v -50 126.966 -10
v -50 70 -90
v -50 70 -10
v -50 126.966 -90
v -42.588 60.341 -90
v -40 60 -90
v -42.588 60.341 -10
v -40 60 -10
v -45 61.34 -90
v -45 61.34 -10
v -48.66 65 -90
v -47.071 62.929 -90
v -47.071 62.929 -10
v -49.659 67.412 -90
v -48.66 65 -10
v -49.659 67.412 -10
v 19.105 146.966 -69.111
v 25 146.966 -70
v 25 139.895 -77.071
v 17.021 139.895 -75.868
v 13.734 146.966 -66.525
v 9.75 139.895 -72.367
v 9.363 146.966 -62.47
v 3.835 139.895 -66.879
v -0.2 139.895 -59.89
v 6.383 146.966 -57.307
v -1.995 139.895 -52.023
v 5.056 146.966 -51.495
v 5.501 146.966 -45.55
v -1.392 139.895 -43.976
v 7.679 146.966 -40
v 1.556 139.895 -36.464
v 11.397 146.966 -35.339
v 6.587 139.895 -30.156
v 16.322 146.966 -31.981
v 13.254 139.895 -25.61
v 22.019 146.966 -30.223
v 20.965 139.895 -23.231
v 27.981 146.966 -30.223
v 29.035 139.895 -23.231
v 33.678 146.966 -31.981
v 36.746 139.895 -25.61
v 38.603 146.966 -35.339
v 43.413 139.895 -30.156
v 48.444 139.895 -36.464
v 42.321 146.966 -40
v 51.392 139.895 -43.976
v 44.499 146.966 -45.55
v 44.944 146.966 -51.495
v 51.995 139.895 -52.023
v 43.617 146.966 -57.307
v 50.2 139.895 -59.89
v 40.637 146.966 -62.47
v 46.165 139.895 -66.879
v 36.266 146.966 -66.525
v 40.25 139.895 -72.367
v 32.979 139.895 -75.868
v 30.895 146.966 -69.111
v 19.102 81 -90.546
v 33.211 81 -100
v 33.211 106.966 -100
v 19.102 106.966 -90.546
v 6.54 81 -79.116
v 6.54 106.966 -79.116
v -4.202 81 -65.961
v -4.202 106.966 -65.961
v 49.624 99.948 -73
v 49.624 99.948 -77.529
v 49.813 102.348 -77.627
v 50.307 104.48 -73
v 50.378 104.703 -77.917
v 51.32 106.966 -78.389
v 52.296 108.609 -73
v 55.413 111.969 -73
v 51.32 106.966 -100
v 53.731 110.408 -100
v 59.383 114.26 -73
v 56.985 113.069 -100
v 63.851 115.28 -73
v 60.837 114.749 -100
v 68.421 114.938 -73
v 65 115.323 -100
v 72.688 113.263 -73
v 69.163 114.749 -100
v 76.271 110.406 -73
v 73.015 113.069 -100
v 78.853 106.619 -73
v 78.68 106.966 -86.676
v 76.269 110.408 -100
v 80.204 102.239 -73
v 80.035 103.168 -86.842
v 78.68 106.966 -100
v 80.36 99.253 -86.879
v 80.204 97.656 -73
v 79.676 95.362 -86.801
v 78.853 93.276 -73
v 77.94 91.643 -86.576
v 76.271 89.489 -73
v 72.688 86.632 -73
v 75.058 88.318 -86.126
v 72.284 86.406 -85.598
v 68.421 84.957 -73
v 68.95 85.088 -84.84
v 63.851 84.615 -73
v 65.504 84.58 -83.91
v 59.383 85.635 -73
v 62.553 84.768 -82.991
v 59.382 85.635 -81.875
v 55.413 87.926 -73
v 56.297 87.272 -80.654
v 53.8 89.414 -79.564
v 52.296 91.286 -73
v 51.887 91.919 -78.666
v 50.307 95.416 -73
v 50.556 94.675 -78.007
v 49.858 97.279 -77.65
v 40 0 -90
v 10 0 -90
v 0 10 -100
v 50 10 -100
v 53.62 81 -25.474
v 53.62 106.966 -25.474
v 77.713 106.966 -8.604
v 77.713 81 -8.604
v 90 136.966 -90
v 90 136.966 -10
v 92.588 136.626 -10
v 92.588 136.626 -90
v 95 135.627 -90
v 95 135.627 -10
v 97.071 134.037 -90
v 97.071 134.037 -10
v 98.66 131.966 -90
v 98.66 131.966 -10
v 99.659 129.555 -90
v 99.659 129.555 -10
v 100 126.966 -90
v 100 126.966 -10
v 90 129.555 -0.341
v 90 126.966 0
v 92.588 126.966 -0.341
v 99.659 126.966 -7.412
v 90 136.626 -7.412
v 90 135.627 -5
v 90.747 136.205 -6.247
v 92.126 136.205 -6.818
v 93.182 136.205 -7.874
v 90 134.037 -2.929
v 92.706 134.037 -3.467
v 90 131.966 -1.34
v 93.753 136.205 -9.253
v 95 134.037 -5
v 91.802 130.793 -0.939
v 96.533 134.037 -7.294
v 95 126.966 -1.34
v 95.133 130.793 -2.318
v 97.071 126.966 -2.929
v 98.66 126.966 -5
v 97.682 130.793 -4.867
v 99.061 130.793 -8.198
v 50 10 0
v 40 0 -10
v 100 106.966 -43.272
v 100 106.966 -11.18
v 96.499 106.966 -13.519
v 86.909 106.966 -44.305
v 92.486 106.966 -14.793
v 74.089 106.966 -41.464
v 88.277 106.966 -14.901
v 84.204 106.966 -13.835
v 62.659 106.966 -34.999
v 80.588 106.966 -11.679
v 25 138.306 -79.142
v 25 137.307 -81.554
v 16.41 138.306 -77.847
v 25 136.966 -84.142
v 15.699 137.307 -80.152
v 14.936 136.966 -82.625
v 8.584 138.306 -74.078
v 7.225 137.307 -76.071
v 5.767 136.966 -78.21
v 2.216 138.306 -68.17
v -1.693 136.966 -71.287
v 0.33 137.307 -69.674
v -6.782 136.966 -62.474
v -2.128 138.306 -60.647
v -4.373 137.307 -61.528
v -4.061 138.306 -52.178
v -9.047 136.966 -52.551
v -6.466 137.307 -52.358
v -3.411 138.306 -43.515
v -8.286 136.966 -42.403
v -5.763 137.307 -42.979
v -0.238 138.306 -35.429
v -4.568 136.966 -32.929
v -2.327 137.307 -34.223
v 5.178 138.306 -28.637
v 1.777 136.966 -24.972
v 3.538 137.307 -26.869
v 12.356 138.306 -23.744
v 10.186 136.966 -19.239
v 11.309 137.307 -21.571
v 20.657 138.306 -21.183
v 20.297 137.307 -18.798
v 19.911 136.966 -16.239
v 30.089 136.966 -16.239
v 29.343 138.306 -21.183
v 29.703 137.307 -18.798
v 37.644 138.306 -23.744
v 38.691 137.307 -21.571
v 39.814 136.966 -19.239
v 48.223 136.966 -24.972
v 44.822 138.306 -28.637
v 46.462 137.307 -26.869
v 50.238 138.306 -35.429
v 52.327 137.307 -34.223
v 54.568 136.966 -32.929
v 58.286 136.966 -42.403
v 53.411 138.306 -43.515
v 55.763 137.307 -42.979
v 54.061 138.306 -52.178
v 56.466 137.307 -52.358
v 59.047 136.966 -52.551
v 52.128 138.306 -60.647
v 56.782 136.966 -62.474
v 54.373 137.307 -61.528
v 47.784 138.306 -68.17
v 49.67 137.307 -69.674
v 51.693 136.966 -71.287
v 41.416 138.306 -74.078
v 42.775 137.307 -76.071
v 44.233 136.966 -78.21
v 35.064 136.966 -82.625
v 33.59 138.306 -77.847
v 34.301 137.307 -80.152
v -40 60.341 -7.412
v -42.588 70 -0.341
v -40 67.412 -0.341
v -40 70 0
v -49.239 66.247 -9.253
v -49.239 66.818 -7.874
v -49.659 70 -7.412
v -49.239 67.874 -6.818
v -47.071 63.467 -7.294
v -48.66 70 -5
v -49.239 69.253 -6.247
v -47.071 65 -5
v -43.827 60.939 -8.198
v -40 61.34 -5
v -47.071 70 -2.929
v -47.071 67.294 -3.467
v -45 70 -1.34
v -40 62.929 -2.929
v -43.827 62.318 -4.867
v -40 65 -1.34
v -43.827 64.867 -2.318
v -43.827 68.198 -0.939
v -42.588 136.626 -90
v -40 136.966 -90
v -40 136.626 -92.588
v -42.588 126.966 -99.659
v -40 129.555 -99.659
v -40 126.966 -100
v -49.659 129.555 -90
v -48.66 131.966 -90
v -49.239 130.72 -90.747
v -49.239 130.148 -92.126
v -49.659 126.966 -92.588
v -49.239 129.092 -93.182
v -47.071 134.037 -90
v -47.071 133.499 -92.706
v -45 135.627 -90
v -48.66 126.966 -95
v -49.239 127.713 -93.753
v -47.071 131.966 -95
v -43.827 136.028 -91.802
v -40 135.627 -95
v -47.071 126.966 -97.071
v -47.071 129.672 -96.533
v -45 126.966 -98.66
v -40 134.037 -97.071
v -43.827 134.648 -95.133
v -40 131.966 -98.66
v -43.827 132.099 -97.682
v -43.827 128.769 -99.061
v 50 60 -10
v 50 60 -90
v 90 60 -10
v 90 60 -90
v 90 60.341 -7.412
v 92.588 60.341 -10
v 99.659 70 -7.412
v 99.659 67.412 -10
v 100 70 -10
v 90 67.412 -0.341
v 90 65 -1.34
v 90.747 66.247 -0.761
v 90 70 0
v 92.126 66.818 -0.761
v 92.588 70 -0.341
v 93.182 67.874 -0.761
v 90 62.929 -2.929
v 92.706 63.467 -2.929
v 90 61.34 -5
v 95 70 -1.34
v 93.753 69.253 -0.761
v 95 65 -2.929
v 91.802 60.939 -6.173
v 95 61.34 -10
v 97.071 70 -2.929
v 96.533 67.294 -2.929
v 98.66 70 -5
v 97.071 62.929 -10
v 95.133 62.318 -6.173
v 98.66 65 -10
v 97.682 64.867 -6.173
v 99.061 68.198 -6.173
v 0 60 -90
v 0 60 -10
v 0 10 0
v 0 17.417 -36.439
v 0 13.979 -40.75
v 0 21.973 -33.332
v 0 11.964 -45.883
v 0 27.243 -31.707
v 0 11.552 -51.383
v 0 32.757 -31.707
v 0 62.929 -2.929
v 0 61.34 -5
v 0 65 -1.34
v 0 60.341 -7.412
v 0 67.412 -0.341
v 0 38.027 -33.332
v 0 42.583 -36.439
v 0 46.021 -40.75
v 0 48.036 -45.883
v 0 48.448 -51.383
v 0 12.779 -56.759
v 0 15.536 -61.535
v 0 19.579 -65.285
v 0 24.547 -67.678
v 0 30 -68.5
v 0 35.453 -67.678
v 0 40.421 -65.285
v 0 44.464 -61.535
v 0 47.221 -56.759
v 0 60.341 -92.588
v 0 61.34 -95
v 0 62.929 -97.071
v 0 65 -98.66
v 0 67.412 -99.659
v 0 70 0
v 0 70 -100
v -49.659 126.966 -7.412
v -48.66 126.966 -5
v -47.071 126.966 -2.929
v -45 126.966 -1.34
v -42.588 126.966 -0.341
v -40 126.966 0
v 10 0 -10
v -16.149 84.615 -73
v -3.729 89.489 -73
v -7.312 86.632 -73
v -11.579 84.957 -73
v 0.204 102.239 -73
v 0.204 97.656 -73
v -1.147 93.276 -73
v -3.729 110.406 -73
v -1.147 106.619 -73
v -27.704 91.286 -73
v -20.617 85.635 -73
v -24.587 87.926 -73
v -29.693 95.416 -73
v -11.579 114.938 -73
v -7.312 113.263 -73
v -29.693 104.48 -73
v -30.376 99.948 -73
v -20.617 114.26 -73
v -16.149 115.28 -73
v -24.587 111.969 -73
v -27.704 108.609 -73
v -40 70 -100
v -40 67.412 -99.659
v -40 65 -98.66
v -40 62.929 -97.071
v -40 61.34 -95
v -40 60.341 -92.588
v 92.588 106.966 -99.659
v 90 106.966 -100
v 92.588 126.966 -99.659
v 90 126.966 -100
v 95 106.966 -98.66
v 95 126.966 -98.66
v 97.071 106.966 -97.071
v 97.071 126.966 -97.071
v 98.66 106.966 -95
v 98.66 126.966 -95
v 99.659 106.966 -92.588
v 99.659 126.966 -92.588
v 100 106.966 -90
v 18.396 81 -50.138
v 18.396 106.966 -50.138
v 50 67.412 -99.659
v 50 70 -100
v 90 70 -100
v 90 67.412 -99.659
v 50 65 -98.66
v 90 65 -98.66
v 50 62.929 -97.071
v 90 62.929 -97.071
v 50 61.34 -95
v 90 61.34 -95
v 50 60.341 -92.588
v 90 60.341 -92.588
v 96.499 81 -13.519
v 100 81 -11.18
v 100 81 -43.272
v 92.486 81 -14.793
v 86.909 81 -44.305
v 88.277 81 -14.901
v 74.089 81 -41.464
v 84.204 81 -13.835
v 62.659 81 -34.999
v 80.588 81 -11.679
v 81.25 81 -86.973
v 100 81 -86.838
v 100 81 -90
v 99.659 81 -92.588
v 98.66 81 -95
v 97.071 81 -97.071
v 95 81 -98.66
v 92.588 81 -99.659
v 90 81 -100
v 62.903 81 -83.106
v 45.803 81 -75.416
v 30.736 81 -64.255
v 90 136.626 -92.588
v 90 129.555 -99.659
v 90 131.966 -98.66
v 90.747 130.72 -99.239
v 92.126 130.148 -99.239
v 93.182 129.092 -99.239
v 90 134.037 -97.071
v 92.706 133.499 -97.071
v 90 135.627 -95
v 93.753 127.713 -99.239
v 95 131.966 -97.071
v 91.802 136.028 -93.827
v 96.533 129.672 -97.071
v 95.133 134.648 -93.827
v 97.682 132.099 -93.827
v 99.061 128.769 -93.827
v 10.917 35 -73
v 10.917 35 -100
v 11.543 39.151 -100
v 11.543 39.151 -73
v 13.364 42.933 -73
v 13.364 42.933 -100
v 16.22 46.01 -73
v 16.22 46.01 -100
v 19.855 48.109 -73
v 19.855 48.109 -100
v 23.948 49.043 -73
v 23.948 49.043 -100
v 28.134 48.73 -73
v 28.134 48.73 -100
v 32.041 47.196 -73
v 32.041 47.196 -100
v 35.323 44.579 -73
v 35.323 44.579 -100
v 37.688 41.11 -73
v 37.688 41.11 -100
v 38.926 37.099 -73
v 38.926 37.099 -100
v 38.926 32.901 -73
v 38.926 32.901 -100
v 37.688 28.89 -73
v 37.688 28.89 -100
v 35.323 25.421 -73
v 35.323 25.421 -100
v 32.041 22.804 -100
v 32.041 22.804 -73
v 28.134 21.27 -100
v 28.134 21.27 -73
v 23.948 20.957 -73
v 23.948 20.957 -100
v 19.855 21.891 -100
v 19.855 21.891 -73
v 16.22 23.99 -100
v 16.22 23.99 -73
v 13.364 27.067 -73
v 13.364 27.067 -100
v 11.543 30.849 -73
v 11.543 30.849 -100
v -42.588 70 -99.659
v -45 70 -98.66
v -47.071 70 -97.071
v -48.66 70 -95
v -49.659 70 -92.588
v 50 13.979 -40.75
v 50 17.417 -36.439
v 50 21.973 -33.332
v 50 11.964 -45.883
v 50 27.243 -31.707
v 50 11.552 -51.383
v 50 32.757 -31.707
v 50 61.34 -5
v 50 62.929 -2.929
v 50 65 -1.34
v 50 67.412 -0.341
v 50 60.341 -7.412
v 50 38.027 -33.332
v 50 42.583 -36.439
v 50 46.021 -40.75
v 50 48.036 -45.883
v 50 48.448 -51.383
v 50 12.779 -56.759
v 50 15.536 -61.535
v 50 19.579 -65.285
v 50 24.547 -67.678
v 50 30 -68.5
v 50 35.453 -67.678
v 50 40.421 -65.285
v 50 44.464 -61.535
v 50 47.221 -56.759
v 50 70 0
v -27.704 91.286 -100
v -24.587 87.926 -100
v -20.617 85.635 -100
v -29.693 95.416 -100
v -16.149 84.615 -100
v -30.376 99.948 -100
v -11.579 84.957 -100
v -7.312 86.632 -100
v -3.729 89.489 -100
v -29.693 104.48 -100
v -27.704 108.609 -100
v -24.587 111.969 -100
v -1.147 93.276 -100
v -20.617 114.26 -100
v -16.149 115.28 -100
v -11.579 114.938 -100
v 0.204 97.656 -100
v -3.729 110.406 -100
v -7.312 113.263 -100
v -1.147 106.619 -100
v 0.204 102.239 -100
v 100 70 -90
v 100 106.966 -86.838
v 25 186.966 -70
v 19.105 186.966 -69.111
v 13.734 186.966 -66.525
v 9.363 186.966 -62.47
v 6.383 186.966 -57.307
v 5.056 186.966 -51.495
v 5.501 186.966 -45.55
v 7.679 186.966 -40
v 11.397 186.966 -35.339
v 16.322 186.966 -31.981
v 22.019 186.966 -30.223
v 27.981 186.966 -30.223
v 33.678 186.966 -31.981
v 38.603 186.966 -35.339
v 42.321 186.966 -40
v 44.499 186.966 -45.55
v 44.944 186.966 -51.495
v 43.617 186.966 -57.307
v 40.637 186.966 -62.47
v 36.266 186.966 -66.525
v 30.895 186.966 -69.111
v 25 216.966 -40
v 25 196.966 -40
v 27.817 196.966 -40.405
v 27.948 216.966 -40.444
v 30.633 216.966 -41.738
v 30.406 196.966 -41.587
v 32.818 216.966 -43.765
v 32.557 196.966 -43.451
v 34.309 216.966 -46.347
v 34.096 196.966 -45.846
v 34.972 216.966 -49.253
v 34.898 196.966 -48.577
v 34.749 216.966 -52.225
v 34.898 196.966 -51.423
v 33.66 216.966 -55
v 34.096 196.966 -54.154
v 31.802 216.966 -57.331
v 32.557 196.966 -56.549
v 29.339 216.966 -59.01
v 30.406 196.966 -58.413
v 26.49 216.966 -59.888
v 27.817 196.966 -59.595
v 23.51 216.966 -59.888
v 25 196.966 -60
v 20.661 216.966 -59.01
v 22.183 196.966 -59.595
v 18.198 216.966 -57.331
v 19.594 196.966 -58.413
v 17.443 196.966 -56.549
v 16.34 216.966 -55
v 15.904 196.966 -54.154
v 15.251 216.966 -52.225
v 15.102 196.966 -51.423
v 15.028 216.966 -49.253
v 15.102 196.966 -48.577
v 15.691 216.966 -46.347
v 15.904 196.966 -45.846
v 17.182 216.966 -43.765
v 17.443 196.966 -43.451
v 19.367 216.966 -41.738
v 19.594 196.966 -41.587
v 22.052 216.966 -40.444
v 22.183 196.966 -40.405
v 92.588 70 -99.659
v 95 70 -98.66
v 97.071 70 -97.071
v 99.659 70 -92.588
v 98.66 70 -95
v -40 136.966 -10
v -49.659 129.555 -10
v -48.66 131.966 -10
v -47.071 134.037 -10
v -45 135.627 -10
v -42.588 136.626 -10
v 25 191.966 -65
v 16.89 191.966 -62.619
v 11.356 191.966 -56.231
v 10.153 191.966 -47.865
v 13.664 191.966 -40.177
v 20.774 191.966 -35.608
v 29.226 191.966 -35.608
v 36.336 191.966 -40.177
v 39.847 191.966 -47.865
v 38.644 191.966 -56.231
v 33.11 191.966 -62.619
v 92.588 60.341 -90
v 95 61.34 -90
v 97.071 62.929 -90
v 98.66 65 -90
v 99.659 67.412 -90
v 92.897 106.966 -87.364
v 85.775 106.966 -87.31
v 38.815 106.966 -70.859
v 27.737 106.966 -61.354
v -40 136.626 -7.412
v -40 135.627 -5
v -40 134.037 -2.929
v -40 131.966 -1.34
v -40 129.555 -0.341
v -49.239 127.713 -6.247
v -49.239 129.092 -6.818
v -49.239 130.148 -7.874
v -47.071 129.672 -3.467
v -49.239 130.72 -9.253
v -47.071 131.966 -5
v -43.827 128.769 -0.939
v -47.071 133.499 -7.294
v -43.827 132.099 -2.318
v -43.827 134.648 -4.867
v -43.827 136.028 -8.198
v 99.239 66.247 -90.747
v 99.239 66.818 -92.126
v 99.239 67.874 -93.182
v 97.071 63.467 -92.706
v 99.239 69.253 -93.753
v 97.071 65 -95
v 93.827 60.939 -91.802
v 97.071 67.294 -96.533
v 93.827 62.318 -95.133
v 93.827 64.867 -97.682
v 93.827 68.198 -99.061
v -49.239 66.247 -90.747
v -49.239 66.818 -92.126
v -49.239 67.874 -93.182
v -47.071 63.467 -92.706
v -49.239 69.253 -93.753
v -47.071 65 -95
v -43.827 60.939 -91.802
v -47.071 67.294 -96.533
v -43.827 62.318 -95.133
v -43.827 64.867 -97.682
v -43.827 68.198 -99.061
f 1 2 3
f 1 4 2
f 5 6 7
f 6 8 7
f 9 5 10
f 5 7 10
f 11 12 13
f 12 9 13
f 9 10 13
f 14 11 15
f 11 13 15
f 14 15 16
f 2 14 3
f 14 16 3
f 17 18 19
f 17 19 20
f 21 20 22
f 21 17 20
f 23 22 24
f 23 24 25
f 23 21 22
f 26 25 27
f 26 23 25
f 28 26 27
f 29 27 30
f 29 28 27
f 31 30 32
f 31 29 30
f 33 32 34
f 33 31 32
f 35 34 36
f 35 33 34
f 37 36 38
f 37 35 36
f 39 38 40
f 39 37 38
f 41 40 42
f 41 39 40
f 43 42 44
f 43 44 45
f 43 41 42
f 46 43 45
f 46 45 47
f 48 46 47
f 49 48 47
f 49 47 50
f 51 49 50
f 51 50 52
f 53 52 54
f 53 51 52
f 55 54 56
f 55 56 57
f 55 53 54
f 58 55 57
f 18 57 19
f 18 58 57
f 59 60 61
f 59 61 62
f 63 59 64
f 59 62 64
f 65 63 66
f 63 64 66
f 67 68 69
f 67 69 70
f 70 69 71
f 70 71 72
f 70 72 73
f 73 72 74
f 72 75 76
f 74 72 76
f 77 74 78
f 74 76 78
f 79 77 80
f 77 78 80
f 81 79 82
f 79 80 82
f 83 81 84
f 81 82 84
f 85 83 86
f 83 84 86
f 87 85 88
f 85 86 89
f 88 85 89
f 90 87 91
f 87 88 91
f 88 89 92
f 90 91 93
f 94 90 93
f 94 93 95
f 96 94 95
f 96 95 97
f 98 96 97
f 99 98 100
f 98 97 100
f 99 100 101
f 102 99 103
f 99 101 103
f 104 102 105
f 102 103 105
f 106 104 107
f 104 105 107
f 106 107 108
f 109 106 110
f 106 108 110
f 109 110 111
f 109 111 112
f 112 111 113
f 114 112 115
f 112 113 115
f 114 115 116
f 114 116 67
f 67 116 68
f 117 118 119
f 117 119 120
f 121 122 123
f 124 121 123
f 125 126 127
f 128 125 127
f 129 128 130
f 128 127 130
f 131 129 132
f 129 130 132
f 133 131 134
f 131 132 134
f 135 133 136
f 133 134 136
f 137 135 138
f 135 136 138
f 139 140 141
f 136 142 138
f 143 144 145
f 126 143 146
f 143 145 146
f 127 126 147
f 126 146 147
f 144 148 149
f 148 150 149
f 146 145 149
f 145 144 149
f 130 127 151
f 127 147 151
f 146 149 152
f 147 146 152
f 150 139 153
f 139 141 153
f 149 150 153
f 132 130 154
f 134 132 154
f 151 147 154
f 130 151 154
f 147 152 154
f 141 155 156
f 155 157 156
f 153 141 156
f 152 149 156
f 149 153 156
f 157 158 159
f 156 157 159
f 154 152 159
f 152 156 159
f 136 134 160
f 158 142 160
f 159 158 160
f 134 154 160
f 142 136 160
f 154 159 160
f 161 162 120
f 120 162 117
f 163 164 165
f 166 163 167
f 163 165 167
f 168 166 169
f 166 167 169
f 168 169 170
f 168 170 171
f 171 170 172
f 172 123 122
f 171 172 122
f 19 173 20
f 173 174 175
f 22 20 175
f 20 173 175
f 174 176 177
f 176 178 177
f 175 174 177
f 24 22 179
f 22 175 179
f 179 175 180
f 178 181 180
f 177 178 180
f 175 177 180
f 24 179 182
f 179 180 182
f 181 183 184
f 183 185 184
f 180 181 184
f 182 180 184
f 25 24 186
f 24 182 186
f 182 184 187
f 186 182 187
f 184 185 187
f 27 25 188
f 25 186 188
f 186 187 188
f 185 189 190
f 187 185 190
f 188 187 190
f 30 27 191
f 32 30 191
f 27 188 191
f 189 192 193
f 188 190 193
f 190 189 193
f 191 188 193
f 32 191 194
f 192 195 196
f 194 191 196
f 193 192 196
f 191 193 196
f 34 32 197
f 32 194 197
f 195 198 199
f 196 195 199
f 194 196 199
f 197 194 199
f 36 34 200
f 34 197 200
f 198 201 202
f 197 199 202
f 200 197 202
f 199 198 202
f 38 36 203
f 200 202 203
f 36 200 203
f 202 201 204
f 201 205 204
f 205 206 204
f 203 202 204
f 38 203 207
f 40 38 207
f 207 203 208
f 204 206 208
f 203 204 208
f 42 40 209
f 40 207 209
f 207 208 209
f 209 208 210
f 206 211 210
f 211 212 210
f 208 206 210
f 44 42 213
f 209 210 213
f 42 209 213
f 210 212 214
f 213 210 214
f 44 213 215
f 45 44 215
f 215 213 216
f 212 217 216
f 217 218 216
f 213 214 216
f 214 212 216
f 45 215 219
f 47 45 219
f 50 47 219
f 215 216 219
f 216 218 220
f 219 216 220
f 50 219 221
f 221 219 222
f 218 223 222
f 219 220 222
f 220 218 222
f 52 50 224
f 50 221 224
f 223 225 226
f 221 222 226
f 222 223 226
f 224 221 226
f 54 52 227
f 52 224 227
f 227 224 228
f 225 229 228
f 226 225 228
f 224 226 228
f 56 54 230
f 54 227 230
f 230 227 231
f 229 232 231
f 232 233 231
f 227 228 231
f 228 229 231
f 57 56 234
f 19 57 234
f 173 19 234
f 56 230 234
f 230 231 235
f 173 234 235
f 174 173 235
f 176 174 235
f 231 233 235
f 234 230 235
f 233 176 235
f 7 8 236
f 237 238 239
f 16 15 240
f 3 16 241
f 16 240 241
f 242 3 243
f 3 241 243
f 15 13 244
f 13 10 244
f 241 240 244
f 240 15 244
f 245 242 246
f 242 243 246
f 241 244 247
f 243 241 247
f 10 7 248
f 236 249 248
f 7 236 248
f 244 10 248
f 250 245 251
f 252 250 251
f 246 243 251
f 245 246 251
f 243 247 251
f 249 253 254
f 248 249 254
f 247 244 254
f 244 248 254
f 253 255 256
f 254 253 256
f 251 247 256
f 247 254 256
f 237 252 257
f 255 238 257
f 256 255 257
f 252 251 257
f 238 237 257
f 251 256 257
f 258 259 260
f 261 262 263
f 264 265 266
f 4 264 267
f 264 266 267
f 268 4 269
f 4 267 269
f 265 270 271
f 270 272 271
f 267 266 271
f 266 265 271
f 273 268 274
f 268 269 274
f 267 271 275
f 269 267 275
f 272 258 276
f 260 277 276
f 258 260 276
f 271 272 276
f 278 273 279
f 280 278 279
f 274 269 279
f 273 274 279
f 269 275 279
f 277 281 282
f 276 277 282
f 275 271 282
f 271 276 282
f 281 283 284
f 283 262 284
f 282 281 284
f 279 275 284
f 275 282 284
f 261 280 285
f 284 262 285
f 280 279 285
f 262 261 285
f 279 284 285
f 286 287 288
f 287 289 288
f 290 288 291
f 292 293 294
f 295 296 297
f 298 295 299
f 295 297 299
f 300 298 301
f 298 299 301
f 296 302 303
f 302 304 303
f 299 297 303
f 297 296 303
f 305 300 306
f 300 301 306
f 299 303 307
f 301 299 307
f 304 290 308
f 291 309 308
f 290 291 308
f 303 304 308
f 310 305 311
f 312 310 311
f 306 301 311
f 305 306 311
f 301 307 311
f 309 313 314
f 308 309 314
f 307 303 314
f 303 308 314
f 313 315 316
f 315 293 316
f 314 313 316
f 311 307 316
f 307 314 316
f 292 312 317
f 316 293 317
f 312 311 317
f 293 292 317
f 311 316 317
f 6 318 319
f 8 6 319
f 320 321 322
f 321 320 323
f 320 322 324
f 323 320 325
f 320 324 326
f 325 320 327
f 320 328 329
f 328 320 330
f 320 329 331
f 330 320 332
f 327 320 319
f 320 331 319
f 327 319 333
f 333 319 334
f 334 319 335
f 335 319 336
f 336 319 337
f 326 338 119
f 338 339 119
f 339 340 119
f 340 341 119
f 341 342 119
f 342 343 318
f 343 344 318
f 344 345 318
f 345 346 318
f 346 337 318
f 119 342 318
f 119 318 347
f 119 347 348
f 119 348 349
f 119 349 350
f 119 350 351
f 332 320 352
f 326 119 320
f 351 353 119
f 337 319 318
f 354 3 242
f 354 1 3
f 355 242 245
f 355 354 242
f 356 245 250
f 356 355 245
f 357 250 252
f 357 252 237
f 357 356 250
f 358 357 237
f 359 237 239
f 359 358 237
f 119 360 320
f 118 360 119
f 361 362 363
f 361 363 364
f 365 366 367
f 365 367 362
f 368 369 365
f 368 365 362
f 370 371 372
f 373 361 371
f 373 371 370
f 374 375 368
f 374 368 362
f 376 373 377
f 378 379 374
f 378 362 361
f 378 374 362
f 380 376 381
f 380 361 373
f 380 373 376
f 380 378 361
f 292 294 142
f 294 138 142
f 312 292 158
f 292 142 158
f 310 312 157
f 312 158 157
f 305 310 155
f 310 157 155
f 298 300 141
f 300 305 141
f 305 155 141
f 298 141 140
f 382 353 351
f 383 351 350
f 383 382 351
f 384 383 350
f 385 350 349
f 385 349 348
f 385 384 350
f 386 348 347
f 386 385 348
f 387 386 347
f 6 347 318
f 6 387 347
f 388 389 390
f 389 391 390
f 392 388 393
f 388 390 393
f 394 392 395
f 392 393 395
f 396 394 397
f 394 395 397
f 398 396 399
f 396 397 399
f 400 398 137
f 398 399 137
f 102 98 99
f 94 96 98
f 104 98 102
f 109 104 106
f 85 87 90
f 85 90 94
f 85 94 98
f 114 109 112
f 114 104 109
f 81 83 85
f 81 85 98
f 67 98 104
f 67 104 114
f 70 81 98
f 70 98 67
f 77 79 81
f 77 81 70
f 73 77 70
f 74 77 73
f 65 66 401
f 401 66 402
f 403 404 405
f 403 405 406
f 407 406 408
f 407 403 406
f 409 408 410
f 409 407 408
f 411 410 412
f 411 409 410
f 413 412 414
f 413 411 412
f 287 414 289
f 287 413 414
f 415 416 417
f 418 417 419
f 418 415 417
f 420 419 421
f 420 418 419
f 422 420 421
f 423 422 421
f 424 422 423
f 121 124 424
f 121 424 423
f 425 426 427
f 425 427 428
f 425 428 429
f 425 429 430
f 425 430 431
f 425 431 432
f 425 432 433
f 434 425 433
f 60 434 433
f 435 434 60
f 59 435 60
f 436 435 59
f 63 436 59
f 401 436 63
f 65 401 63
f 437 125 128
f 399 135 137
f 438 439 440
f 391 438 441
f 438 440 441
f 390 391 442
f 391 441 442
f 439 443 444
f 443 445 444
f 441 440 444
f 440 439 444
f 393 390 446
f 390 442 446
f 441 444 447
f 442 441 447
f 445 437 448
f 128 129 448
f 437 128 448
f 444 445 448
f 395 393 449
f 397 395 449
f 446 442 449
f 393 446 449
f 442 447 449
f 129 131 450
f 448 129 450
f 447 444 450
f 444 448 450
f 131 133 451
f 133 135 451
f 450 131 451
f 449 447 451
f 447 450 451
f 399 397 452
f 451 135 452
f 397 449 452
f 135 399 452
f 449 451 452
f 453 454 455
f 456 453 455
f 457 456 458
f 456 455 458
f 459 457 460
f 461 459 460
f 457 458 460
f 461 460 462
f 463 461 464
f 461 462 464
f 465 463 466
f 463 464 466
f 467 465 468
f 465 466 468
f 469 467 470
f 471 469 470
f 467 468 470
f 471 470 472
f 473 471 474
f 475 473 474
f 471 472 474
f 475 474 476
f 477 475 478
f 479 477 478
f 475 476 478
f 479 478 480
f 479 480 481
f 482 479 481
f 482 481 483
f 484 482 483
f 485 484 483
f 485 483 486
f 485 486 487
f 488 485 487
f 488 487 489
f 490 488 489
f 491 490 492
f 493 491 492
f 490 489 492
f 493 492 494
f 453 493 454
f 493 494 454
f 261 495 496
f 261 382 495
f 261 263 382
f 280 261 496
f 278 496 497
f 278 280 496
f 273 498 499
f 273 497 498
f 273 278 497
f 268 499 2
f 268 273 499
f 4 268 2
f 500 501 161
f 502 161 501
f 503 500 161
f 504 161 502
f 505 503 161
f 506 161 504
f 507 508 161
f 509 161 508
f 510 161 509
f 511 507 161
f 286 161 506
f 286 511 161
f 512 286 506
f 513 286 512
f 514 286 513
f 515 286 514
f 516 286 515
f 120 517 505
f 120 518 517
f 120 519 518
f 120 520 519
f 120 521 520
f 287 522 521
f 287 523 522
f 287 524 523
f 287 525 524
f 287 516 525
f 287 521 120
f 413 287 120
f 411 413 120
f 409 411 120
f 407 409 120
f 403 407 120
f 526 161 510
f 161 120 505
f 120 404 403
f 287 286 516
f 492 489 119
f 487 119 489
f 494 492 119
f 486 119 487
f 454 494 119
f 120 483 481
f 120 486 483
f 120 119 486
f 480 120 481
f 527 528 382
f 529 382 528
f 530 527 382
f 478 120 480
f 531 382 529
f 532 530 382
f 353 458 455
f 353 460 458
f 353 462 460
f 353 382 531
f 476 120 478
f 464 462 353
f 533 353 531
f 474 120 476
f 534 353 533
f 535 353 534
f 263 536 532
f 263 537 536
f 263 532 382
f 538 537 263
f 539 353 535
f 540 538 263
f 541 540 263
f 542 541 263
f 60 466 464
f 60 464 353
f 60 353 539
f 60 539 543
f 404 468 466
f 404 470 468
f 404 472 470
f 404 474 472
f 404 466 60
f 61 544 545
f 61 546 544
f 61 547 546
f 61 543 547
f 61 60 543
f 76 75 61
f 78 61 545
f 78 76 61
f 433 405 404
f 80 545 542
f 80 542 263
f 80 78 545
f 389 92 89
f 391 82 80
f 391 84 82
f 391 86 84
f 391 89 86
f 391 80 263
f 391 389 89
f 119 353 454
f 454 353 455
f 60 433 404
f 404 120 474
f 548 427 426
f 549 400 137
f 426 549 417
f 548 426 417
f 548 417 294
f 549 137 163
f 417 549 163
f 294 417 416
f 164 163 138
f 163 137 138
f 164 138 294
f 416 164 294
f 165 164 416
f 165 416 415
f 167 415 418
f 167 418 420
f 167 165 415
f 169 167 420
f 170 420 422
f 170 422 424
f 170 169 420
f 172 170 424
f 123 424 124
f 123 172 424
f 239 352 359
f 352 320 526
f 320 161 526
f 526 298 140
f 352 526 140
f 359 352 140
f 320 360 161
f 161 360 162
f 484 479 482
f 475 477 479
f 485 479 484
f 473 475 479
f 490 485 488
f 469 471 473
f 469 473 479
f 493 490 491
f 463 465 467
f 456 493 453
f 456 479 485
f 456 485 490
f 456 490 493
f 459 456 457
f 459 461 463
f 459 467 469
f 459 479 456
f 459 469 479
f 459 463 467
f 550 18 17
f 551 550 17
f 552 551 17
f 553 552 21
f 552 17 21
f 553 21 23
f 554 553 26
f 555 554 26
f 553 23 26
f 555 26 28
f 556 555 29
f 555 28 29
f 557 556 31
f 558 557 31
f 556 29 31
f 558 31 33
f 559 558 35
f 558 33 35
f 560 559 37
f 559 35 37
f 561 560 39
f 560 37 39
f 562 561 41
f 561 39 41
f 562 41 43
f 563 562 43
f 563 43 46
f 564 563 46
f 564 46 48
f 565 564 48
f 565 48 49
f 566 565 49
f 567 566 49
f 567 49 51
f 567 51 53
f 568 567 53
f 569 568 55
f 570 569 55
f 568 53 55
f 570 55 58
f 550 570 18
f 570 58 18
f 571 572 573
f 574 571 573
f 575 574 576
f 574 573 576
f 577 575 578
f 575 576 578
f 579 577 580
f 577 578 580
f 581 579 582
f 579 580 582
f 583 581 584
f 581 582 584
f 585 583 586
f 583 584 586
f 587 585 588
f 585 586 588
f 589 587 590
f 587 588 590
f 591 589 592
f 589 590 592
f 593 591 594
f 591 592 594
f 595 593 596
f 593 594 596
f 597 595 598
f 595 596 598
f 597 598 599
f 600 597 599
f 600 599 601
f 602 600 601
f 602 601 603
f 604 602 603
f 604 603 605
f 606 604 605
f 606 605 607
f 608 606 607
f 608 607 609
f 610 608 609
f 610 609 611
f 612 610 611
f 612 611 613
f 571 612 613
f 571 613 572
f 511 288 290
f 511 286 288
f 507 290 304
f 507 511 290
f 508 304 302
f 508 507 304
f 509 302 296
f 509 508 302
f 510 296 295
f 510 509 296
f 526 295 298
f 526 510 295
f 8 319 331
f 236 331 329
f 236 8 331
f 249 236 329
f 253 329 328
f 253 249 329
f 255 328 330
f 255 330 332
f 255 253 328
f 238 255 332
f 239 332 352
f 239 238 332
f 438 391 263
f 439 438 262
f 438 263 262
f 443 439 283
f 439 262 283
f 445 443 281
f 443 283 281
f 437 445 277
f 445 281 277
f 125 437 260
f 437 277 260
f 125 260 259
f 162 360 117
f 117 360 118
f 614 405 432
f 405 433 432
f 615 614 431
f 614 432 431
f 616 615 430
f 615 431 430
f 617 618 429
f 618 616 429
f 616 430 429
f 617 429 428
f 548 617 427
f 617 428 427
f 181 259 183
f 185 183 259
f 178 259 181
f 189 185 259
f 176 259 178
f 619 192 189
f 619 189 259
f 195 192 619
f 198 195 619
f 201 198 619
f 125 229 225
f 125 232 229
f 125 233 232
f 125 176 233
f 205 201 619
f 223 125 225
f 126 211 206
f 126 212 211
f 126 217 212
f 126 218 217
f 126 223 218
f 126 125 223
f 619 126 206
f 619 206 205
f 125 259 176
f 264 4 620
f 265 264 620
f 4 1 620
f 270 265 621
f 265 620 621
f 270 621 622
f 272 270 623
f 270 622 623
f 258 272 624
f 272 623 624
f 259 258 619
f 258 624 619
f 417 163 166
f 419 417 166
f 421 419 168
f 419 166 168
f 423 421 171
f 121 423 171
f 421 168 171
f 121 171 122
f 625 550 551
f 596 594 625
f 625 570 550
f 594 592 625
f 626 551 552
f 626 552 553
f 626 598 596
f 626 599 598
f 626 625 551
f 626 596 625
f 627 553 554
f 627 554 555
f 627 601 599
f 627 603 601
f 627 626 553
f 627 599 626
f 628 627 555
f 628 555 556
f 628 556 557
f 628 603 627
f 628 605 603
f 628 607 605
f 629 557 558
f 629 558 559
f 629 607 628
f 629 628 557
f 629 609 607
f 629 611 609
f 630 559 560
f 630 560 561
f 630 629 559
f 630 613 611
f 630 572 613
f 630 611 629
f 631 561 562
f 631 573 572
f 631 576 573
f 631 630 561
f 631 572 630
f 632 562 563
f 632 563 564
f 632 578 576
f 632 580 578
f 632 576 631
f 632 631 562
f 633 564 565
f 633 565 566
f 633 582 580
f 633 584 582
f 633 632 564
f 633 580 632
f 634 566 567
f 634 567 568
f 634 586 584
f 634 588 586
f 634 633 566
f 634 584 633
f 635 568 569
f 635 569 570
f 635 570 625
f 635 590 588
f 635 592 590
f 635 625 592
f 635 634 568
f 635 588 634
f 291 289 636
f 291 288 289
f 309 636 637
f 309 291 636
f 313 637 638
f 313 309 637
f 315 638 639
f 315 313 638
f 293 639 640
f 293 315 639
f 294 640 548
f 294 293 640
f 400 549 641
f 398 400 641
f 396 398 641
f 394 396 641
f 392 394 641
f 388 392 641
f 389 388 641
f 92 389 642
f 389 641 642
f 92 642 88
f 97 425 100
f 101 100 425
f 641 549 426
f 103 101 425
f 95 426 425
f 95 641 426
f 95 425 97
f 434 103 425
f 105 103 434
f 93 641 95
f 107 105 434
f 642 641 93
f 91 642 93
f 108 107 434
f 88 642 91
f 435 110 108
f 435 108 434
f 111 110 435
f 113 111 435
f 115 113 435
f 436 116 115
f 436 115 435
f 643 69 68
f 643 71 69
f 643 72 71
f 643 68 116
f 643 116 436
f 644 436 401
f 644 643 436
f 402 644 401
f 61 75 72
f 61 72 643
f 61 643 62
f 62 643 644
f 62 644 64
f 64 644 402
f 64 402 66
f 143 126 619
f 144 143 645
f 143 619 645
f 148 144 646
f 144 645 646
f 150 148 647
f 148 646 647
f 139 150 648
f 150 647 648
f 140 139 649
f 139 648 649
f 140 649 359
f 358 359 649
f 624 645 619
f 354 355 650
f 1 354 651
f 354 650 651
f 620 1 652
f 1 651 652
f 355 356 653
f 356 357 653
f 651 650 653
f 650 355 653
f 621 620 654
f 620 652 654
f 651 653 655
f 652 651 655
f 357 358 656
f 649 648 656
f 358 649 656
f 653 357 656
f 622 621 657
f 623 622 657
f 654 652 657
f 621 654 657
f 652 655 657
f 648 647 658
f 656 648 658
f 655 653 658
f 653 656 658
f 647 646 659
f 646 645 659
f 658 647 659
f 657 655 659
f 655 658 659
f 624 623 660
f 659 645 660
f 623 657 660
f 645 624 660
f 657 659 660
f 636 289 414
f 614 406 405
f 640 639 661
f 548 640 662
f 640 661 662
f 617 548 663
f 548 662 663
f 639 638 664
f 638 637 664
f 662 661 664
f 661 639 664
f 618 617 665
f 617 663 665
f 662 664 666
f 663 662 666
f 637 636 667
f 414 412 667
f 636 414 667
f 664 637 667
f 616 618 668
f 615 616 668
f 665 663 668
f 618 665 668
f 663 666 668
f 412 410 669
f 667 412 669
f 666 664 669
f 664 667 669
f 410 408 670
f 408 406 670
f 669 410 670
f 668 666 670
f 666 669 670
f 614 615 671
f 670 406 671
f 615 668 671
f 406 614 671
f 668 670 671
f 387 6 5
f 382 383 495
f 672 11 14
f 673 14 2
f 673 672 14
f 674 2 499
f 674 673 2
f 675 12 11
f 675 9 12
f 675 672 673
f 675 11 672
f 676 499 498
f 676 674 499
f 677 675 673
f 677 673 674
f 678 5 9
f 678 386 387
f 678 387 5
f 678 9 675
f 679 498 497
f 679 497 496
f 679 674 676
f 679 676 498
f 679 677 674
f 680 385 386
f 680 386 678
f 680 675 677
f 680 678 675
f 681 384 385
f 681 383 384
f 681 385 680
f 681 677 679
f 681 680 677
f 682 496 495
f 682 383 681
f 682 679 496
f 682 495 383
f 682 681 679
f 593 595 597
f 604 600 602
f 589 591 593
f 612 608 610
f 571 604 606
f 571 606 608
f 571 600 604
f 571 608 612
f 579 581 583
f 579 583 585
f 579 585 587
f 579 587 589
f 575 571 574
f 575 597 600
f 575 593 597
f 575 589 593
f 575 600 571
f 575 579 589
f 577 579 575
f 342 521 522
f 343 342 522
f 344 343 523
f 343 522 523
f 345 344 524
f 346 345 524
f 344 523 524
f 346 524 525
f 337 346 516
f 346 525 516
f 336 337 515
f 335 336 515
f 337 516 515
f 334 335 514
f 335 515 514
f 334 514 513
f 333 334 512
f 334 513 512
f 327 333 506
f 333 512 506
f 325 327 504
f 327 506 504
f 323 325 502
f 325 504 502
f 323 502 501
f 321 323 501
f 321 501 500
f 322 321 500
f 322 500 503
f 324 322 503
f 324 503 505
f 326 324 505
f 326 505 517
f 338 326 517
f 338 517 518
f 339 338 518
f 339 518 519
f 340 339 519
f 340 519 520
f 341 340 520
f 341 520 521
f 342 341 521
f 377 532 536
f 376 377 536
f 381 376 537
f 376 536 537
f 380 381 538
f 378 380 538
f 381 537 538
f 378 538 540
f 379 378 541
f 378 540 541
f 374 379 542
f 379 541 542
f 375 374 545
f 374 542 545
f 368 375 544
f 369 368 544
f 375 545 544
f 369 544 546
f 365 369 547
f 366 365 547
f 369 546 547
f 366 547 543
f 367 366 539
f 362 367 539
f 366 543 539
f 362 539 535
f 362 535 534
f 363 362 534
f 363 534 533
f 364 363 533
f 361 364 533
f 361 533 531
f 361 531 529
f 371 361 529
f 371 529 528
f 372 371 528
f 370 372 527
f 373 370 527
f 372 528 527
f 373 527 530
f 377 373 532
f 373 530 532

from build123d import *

# Parameters (mm, degrees)
ESBO_O2_W                     = 100
ESBO_O2_H                     = 60
RESSALTO_EXTRUS_O1_DEPTH      = 50
RESSALTO_EXTRUS_O2_DEPTH      = 50
RESSALTO_EXTRUS_O2_DEPTH_BACK = 100
ESBO_O3_W                     = 100
ESBO_O3_H                     = 76.966331483
ESBO_O4_R                     = 20
RESSALTO_EXTRUS_O3_DEPTH      = 60
FILETE1_R                     = 10
CHANFRO1_SIZE                 = 10
ESBO_O6_R                     = 18.5
CORTE_EXTRUS_O1_DEPTH         = 243.47832014
ESBO_O7_R                     = 14.082818634
ESBO_O7_R_2                   = 15.375713497
CORTE_EXTRUS_O2_DEPTH         = 27
ESBO_O8_R                     = 10
RESSALTO_EXTRUS_O4_DEPTH      = 20
FILETE2_R                     = 10
CHANFRO2_SIZE                 = 10
ESBO_O10_W                    = 27.587633248
ESBO_O10_H                    = 25.966331483
ESBO_O10_W_2                  = 29.412366752
CORTE_REVOLU_O1_ANGLE         = 325


with BuildPart() as part:
    # Esboço2 → Ressalto-extrusão1 (new body)
    with BuildSketch(Plane(origin=(0, 0, 0), x_dir=(0, 0, -1), z_dir=(1, 0, 0))):
        with Locations((50, 30)):
            Rectangle(ESBO_O2_W, ESBO_O2_H)
    extrude(amount=RESSALTO_EXTRUS_O1_DEPTH)

    # Esboço3 → Ressalto-extrusão2 (add, two sides: drawn at the far end of the back side and taken through both)
    with BuildSketch(Plane.ZY.offset(-RESSALTO_EXTRUS_O2_DEPTH_BACK)):
        with Locations((-50, 98.483165742)):
            Rectangle(ESBO_O3_W, ESBO_O3_H)
    extrude(amount=RESSALTO_EXTRUS_O2_DEPTH + RESSALTO_EXTRUS_O2_DEPTH_BACK)

    # Esboço4 → Ressalto-extrusão3 (add)
    with BuildSketch(Plane(origin=(0, 136.966331483, 0), x_dir=(1, 0, 0), z_dir=(0, 1, 0))):
        with Locations(Location((25, 50, 0), (0, 0, 90))):
            Circle(ESBO_O4_R)
    extrude(amount=RESSALTO_EXTRUS_O3_DEPTH)

    # Filete1
    filete1_edges = [part.edges().sort_by_distance(p)[0] for p in [
        (-25, 60, -100),
        (75, 60, -100),
        (100, 60, -50),
        (-25, 60, 0),
        (75, 60, 0),
        (100, 98.483165742, 0),
        (25, 136.966331483, 0),
        (100, 136.966331483, -50),
        (25, 136.966331483, -100),
        (100, 98.483165742, -100),
        (-50, 60, -50),
        (-50, 98.483165742, 0),
        (-50, 136.966331483, -50),
        (-50, 98.483165742, -100),
    ]]
    fillet(filete1_edges, radius=FILETE1_R)

    # Chanfro1
    chanfro1_edges = [part.edges().sort_by_distance(p)[0] for p in [
        (25, 136.966331483, -30),
        (25, 196.966331483, -30),
    ]]
    chamfer(chanfro1_edges, length=CHANFRO1_SIZE)

    # Esboço6 → Corte-extrusão1 (cut, through all)
    with BuildSketch(Plane(origin=(50, 0, 0), x_dir=(0, 0, -1), z_dir=(1, 0, 0))):
        with Locations((50, 30)):
            Circle(ESBO_O6_R)
    extrude(amount=-CORTE_EXTRUS_O1_DEPTH, mode=Mode.SUBTRACT)

    # Esboço7 → Corte-extrusão2 (cut)
    with BuildSketch(Plane(origin=(0, 0, -100), x_dir=(-1, 0, 0), z_dir=(0, 0, -1))):
        with Locations((-25, 35)):
            Circle(ESBO_O7_R)
        with Locations((15, 99.947585823)):
            Circle(ESBO_O7_R_2)
        with Locations((-65, 99.947585823)):
            Circle(ESBO_O7_R_2)
    extrude(amount=-CORTE_EXTRUS_O2_DEPTH, mode=Mode.SUBTRACT)

    # Esboço8 → Ressalto-extrusão4 (add)
    with BuildSketch(Plane(origin=(0, 196.966331483, 0), x_dir=(1, 0, 0), z_dir=(0, 1, 0))):
        with Locations(Location((25, 50, 0), (0, 0, 270))):
            Circle(ESBO_O8_R)
    extrude(amount=RESSALTO_EXTRUS_O4_DEPTH)

    # Filete2
    filete2_edges = [part.edges().sort_by_distance(p)[0] for p in [
        (25, 136.966331483, -20),
    ]]
    fillet(filete2_edges, radius=FILETE2_R)

    # Chanfro2
    chanfro2_edges = [part.edges().sort_by_distance(p)[0] for p in [
        (50, 0, -50),
        (0, 0, -50),
        (25, 0, -100),
        (25, 0, 0),
    ]]
    chamfer(chanfro2_edges, length=CHANFRO2_SIZE)

    # Esboço10 → Corte-Revolução1 (revolve, cut)
    with BuildSketch(Plane.XY):
        with Locations((-11.206183376, 93.983165742)):
            Rectangle(ESBO_O10_W, ESBO_O10_H)
        with Locations((60.293816624, 93.983165742)):
            Rectangle(ESBO_O10_W_2, ESBO_O10_H)
    revolve(axis=Axis((90, 136.966331483, 0), (0, 1, 0)), revolution_arc=CORTE_REVOLU_O1_ANGLE, mode=Mode.SUBTRACT)


solid = part.part
